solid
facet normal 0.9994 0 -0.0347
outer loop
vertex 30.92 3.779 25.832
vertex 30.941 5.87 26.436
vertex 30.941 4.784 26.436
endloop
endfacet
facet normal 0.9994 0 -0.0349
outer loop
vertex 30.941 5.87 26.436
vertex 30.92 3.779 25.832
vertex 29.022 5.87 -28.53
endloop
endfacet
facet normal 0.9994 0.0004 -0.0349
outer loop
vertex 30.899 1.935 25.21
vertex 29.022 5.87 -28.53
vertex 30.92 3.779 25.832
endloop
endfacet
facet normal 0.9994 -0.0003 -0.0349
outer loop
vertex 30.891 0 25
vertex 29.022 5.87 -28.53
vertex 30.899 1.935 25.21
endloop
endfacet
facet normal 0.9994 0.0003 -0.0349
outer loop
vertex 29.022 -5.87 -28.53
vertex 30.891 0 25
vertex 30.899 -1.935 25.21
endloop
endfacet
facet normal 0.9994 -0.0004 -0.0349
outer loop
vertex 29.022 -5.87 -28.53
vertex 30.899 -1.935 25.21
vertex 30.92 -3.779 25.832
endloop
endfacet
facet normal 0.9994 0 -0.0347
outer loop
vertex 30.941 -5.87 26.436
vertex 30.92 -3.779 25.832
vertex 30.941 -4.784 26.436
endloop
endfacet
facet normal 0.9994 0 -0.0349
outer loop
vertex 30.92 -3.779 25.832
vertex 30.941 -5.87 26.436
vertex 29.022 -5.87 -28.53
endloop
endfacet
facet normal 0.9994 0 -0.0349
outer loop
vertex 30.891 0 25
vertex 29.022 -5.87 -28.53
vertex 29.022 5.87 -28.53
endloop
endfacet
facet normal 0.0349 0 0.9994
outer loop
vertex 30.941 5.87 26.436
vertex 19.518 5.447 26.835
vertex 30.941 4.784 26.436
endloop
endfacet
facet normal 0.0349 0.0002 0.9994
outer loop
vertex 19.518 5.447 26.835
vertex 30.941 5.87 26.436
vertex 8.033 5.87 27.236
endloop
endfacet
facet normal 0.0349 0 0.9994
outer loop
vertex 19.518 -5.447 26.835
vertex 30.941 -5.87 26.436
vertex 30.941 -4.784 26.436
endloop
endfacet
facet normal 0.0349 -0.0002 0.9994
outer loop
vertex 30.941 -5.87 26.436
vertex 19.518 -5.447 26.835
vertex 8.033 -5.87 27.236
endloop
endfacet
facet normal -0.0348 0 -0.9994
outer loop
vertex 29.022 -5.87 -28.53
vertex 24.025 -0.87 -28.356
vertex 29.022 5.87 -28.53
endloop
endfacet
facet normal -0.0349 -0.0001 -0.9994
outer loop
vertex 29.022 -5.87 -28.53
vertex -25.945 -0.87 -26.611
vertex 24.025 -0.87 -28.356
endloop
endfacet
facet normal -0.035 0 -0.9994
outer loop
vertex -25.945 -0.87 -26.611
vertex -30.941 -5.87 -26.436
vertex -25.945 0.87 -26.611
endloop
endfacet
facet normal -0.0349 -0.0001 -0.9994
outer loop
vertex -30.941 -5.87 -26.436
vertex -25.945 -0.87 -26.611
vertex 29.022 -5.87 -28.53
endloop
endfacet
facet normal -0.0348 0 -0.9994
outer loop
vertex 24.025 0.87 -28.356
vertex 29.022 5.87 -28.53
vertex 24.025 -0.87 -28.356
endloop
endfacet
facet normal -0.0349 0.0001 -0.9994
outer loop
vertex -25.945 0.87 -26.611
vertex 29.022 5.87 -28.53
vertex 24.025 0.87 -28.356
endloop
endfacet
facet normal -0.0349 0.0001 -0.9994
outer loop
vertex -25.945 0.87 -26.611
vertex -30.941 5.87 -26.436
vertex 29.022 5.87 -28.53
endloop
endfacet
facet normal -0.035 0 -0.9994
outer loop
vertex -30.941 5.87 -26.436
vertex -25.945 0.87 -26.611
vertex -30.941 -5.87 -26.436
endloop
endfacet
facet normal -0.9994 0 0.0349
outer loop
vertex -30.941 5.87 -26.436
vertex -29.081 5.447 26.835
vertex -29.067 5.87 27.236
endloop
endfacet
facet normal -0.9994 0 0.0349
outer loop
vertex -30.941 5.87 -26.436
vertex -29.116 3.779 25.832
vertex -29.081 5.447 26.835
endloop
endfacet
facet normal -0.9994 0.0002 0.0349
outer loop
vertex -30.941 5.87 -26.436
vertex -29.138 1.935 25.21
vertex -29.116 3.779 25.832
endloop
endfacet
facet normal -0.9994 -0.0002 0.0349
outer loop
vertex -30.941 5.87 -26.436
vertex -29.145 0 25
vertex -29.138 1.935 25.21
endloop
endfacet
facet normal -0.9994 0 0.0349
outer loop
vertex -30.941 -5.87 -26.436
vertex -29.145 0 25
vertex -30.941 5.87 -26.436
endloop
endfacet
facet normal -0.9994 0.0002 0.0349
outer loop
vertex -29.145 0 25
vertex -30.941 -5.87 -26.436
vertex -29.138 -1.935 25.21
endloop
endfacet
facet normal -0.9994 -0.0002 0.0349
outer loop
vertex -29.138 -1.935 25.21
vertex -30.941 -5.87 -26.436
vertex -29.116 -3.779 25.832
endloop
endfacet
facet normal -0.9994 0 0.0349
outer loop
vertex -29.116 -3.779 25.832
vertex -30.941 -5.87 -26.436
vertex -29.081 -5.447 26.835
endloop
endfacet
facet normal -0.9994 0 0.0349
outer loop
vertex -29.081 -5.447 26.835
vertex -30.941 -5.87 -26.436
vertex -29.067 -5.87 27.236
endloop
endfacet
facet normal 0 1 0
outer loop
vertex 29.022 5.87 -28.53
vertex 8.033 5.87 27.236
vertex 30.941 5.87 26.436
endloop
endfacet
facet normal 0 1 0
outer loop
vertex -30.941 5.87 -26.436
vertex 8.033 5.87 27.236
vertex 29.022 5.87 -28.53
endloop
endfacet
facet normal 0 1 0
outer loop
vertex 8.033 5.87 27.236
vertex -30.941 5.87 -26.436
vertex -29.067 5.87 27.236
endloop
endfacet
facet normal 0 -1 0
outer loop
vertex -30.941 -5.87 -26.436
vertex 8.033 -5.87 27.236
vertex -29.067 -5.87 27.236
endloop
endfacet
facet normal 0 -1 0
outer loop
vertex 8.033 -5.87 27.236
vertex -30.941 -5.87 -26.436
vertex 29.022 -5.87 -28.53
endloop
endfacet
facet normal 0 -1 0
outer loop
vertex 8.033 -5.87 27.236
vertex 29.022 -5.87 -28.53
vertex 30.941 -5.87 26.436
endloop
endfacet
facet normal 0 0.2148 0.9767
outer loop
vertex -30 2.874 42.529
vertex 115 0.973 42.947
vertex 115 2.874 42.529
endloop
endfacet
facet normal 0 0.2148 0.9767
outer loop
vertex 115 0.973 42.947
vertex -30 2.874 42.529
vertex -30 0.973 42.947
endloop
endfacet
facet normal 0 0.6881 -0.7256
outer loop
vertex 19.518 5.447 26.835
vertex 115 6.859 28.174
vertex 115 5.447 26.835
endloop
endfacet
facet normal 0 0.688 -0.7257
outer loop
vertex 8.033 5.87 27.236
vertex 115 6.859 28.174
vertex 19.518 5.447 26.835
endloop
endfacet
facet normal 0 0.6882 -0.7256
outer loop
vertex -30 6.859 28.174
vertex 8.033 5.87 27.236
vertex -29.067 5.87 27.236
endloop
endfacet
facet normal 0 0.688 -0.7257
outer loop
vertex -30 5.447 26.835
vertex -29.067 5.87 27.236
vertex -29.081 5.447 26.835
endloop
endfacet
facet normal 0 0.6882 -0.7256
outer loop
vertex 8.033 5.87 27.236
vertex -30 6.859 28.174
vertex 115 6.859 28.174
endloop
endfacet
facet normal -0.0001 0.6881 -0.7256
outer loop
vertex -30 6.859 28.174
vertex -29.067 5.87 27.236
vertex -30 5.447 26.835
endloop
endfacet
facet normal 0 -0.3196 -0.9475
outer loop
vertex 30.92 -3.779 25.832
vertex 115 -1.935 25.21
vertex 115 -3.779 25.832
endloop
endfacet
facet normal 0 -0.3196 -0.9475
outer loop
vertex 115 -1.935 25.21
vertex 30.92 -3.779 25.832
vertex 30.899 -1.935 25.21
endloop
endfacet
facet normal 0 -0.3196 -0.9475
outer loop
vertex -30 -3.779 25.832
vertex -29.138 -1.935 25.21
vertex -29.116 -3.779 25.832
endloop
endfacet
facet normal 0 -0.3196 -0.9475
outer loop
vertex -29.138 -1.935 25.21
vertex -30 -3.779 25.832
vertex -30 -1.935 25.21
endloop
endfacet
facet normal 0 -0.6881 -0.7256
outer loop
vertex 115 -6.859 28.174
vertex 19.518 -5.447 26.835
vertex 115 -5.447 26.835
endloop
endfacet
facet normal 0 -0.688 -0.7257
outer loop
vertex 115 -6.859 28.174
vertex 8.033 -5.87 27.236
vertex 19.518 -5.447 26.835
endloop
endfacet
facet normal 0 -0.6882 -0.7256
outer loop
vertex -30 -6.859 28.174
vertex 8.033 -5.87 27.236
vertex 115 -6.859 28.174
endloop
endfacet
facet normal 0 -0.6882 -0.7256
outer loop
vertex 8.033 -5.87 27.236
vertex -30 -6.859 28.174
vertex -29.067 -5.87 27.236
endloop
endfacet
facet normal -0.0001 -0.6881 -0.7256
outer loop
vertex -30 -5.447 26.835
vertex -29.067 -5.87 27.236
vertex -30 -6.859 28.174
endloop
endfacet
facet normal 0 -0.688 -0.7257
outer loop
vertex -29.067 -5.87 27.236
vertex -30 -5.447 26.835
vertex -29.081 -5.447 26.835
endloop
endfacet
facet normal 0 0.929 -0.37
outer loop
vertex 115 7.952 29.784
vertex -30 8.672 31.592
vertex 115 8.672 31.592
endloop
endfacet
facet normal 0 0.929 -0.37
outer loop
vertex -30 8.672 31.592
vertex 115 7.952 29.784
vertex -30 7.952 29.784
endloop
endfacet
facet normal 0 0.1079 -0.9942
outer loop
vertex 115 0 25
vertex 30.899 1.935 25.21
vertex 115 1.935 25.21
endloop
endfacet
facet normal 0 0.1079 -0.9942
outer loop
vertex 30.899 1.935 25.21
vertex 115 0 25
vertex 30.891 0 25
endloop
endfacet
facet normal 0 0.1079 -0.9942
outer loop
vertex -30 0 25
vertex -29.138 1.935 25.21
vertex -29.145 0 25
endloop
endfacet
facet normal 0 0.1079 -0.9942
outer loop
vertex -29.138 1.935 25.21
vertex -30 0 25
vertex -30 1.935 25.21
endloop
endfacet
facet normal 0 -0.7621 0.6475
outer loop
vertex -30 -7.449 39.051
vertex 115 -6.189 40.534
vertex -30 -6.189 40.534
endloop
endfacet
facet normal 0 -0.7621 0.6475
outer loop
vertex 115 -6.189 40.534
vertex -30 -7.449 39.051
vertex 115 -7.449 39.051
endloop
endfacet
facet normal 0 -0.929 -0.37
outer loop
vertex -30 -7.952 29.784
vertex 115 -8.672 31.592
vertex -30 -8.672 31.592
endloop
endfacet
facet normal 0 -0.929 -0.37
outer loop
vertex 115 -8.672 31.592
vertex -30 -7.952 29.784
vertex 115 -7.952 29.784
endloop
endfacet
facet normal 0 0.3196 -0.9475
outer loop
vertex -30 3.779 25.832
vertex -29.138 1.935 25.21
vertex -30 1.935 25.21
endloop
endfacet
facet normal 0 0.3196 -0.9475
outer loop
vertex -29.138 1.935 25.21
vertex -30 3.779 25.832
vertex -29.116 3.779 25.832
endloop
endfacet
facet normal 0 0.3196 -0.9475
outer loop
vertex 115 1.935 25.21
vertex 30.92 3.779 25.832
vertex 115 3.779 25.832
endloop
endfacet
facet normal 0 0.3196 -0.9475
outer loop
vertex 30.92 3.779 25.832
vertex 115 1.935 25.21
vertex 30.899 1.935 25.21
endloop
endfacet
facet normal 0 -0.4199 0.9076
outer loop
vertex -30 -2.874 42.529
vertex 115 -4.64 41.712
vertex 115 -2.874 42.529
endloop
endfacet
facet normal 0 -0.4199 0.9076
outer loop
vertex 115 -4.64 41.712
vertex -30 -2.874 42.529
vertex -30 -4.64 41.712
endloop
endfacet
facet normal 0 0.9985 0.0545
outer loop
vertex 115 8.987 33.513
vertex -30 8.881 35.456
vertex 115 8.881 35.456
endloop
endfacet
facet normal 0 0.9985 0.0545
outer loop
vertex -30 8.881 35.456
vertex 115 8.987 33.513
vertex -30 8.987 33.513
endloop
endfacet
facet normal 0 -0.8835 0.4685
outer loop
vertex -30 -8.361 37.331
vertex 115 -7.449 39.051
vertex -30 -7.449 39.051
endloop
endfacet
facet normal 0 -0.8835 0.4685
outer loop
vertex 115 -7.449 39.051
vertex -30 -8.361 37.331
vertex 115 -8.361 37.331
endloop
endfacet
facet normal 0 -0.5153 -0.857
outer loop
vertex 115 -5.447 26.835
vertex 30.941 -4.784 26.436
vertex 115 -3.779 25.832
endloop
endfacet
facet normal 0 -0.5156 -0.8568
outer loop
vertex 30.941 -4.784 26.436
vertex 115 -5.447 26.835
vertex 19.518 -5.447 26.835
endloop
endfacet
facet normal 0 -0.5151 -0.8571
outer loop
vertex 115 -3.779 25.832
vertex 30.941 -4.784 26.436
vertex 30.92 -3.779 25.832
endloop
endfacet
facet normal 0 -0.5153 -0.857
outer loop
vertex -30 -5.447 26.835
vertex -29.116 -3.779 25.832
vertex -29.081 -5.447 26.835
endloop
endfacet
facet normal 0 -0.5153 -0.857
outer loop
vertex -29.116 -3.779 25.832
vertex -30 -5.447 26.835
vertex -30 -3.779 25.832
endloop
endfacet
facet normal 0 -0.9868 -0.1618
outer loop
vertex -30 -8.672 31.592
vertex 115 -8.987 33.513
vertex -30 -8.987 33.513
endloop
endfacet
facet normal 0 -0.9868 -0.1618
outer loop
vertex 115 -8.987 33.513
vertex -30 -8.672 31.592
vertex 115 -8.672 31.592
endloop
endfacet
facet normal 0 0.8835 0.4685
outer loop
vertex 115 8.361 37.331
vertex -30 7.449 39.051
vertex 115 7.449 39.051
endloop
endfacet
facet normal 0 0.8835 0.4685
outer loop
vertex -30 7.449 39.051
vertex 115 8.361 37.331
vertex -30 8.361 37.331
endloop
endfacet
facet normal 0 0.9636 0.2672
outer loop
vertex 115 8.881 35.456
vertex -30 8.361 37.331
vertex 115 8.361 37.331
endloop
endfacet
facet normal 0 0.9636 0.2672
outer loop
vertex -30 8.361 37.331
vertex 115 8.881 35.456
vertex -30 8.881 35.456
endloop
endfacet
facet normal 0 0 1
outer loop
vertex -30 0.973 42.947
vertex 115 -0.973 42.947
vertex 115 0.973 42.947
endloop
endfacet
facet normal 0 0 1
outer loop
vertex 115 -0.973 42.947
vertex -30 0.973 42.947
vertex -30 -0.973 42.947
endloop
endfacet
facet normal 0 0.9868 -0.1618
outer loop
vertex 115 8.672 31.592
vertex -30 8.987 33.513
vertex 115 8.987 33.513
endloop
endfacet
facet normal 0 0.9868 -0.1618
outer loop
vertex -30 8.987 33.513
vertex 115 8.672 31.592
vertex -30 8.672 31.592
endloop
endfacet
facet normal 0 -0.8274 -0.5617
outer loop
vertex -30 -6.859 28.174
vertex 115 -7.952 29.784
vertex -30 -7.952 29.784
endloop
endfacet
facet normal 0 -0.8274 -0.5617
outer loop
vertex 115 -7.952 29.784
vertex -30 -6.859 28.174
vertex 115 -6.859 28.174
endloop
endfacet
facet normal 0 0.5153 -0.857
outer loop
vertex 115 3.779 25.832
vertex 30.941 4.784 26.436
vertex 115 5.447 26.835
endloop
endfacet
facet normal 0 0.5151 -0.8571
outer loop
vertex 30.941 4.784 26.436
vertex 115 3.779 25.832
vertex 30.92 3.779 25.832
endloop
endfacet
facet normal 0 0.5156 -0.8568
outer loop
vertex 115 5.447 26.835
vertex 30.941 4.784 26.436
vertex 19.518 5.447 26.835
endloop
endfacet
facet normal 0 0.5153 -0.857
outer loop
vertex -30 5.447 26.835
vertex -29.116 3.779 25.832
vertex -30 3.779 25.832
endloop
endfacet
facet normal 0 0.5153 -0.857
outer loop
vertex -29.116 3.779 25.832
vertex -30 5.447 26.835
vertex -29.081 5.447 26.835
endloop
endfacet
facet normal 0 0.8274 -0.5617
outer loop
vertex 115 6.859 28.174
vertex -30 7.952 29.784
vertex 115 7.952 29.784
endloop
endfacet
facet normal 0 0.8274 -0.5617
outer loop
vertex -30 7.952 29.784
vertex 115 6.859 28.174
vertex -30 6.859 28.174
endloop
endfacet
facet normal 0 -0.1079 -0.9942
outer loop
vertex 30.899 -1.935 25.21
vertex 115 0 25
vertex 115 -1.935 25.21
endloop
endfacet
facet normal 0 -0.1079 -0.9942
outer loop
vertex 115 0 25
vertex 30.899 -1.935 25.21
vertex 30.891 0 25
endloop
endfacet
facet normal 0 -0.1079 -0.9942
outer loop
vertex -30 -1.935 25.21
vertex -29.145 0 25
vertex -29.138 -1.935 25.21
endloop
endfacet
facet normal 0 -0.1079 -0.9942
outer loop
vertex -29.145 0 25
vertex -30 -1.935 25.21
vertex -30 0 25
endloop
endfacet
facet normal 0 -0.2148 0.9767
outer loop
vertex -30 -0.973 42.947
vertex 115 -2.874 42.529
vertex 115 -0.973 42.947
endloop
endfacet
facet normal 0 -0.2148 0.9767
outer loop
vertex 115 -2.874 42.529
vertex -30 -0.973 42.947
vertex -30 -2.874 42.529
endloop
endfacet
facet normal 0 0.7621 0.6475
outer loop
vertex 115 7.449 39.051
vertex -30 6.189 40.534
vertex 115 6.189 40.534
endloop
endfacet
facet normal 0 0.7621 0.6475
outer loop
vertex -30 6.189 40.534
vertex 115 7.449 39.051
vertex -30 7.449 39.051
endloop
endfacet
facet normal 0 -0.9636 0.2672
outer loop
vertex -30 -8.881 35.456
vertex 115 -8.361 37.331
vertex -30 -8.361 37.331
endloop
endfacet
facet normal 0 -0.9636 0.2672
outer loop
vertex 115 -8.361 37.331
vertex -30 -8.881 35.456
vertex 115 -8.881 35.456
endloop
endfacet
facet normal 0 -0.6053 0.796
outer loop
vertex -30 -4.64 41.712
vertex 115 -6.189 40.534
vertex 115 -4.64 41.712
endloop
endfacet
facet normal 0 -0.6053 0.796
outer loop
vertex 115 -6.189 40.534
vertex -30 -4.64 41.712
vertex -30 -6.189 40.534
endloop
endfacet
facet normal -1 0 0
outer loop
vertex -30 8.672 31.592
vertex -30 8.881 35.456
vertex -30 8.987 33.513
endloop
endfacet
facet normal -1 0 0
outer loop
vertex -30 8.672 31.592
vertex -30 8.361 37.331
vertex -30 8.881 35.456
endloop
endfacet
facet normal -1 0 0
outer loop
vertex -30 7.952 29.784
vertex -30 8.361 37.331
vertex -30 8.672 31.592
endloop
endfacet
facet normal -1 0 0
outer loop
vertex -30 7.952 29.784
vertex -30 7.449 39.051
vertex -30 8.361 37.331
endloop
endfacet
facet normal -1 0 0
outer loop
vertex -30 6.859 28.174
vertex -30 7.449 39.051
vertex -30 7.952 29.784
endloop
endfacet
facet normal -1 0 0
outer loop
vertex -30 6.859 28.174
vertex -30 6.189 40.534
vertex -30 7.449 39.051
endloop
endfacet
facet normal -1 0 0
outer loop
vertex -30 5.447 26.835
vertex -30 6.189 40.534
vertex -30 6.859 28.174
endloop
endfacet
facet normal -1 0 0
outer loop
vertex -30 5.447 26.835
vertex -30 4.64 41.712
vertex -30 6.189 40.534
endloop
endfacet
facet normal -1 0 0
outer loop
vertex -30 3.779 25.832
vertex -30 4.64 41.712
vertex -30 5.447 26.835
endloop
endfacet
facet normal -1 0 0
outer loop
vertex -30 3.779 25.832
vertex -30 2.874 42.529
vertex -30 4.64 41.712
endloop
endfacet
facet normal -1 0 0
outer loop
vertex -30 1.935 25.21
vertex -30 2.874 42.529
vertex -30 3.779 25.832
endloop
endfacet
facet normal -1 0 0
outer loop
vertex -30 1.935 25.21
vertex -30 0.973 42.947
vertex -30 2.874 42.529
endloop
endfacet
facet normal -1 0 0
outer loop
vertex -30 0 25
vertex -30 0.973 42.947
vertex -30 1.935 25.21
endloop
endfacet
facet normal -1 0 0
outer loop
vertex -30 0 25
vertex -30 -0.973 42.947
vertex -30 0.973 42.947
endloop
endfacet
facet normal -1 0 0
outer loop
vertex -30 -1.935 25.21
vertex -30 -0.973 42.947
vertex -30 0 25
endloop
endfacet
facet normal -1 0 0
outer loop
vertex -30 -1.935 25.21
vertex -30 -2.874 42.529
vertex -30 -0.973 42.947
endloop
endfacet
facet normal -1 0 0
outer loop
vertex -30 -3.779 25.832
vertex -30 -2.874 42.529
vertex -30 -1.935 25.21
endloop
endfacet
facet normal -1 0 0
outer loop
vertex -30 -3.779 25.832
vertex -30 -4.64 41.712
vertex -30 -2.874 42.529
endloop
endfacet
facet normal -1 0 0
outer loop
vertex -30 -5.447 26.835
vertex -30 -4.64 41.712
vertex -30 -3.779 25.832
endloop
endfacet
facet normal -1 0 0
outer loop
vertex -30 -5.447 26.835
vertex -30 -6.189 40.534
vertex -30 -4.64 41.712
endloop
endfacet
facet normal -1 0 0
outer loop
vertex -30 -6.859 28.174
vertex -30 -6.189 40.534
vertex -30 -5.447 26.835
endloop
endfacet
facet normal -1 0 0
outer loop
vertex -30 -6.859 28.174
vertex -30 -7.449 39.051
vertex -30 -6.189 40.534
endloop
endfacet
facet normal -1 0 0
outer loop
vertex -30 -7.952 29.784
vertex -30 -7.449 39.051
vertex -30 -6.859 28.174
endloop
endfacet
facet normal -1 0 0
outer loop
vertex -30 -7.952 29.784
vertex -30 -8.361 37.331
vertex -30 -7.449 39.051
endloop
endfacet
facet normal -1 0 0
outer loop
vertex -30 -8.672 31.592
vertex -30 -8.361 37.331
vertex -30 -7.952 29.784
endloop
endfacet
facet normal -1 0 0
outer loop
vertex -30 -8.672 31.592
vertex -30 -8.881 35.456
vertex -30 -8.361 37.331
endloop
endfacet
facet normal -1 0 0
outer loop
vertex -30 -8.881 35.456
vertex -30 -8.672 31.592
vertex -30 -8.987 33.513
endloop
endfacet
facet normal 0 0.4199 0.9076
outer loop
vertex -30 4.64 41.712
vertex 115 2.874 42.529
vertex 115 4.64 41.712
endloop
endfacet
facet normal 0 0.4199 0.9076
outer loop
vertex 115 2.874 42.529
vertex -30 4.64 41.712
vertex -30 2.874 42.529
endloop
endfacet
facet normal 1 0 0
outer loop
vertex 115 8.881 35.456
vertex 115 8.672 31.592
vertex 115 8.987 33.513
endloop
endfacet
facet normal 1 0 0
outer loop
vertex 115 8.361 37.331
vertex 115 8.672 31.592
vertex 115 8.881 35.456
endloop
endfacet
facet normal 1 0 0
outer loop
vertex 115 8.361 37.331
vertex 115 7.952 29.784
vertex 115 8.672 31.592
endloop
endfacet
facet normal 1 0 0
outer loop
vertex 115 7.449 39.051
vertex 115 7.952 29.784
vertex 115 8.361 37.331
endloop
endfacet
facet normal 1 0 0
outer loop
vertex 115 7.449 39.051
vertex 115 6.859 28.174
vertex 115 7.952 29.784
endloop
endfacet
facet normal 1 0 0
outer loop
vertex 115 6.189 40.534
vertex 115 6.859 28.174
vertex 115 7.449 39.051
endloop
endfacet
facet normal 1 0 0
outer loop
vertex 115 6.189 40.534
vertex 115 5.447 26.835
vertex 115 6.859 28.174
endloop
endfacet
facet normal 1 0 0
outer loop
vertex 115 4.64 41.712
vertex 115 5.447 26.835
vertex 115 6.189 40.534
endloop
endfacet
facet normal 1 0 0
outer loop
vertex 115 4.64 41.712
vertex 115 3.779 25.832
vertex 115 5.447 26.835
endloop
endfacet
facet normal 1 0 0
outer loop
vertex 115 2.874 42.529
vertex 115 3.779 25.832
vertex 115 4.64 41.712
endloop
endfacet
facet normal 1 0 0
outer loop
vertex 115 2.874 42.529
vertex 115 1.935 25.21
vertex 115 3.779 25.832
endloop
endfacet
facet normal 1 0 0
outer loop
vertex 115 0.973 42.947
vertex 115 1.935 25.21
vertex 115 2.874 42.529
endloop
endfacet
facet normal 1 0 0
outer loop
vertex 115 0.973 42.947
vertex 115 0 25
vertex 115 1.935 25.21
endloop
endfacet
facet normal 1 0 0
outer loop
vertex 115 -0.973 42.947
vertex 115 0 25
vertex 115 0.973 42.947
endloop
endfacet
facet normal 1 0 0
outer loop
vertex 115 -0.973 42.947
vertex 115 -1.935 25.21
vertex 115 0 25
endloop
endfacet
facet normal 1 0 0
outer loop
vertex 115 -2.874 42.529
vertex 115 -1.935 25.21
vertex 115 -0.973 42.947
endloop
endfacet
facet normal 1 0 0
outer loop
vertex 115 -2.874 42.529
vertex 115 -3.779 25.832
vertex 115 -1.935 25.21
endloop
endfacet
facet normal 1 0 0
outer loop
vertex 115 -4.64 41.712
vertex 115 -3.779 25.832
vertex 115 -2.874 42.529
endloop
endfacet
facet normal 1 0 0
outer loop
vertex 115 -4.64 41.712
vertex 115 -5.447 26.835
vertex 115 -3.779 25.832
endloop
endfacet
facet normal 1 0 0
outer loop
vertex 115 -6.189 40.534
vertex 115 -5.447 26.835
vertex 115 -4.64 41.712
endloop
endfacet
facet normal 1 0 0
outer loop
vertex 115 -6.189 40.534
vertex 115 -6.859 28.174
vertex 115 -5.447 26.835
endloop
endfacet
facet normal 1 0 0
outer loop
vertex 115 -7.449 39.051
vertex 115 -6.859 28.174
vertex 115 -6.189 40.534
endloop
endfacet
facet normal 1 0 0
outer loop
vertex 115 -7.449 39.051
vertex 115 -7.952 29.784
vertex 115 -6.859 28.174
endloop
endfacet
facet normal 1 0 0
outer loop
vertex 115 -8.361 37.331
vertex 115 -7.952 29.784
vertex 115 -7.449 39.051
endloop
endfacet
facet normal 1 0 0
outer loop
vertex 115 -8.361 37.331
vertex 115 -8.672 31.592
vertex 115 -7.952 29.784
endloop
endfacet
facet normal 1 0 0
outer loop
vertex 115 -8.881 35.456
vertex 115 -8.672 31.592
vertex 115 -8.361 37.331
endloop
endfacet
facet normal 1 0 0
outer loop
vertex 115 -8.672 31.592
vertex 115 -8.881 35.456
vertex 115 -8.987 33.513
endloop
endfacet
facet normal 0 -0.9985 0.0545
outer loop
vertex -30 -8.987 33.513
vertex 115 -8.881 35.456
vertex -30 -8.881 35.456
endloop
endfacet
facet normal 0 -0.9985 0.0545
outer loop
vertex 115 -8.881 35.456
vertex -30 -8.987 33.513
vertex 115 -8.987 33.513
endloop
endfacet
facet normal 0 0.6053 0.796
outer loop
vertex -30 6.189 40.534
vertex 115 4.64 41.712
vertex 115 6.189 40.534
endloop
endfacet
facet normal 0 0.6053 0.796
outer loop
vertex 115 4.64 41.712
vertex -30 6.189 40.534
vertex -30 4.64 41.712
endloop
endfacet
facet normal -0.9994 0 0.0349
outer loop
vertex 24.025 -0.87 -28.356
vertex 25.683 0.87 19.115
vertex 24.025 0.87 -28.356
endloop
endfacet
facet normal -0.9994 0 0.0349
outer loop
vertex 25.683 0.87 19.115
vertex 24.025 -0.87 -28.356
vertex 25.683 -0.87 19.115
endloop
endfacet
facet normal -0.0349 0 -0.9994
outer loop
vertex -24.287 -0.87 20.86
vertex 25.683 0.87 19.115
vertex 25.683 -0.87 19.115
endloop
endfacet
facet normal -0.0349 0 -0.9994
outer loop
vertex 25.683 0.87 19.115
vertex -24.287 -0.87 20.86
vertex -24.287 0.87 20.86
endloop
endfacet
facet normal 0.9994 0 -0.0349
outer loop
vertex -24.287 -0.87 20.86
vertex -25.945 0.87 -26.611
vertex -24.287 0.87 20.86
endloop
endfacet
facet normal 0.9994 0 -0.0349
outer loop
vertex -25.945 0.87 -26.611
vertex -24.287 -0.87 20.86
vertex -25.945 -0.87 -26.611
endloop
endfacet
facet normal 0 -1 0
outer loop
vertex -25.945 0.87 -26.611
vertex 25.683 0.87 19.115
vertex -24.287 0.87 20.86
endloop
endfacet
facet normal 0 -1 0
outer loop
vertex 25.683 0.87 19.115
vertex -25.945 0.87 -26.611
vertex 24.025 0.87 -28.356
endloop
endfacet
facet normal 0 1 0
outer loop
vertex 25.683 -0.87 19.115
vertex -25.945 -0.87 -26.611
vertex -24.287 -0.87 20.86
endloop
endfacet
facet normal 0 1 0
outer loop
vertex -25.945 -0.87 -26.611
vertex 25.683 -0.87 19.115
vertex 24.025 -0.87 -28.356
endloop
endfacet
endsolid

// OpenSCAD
mount_width = 50; //mm
mount_thickness = 1.74; //mm
mount_height = 50; //mm

wall_thickness = 5; //mm
spool_thickness = 18; //mm
spool_length = 85; //mm

difference() {
  union() {
    rotate([0,2,0]) {
      cube([
            mount_width + 2 * wall_thickness,
            mount_thickness + 2 * wall_thickness,
            mount_height + wall_thickness
      ], true);
    }

    translate([spool_length / 2, 0, mount_height / 2 + spool_thickness / 2]) {
      rotate([0, 90, 0]) {
        cylinder(
          d = spool_thickness,
          h = spool_length + mount_width + 2 * wall_thickness,
          center = true);
      }
    }
  }
  rotate([0,2,0]) {
    translate([0, 0, - wall_thickness]) {
      cube([
            mount_width,
            mount_thickness,
            mount_height
            ], true);
    }
  }
}
